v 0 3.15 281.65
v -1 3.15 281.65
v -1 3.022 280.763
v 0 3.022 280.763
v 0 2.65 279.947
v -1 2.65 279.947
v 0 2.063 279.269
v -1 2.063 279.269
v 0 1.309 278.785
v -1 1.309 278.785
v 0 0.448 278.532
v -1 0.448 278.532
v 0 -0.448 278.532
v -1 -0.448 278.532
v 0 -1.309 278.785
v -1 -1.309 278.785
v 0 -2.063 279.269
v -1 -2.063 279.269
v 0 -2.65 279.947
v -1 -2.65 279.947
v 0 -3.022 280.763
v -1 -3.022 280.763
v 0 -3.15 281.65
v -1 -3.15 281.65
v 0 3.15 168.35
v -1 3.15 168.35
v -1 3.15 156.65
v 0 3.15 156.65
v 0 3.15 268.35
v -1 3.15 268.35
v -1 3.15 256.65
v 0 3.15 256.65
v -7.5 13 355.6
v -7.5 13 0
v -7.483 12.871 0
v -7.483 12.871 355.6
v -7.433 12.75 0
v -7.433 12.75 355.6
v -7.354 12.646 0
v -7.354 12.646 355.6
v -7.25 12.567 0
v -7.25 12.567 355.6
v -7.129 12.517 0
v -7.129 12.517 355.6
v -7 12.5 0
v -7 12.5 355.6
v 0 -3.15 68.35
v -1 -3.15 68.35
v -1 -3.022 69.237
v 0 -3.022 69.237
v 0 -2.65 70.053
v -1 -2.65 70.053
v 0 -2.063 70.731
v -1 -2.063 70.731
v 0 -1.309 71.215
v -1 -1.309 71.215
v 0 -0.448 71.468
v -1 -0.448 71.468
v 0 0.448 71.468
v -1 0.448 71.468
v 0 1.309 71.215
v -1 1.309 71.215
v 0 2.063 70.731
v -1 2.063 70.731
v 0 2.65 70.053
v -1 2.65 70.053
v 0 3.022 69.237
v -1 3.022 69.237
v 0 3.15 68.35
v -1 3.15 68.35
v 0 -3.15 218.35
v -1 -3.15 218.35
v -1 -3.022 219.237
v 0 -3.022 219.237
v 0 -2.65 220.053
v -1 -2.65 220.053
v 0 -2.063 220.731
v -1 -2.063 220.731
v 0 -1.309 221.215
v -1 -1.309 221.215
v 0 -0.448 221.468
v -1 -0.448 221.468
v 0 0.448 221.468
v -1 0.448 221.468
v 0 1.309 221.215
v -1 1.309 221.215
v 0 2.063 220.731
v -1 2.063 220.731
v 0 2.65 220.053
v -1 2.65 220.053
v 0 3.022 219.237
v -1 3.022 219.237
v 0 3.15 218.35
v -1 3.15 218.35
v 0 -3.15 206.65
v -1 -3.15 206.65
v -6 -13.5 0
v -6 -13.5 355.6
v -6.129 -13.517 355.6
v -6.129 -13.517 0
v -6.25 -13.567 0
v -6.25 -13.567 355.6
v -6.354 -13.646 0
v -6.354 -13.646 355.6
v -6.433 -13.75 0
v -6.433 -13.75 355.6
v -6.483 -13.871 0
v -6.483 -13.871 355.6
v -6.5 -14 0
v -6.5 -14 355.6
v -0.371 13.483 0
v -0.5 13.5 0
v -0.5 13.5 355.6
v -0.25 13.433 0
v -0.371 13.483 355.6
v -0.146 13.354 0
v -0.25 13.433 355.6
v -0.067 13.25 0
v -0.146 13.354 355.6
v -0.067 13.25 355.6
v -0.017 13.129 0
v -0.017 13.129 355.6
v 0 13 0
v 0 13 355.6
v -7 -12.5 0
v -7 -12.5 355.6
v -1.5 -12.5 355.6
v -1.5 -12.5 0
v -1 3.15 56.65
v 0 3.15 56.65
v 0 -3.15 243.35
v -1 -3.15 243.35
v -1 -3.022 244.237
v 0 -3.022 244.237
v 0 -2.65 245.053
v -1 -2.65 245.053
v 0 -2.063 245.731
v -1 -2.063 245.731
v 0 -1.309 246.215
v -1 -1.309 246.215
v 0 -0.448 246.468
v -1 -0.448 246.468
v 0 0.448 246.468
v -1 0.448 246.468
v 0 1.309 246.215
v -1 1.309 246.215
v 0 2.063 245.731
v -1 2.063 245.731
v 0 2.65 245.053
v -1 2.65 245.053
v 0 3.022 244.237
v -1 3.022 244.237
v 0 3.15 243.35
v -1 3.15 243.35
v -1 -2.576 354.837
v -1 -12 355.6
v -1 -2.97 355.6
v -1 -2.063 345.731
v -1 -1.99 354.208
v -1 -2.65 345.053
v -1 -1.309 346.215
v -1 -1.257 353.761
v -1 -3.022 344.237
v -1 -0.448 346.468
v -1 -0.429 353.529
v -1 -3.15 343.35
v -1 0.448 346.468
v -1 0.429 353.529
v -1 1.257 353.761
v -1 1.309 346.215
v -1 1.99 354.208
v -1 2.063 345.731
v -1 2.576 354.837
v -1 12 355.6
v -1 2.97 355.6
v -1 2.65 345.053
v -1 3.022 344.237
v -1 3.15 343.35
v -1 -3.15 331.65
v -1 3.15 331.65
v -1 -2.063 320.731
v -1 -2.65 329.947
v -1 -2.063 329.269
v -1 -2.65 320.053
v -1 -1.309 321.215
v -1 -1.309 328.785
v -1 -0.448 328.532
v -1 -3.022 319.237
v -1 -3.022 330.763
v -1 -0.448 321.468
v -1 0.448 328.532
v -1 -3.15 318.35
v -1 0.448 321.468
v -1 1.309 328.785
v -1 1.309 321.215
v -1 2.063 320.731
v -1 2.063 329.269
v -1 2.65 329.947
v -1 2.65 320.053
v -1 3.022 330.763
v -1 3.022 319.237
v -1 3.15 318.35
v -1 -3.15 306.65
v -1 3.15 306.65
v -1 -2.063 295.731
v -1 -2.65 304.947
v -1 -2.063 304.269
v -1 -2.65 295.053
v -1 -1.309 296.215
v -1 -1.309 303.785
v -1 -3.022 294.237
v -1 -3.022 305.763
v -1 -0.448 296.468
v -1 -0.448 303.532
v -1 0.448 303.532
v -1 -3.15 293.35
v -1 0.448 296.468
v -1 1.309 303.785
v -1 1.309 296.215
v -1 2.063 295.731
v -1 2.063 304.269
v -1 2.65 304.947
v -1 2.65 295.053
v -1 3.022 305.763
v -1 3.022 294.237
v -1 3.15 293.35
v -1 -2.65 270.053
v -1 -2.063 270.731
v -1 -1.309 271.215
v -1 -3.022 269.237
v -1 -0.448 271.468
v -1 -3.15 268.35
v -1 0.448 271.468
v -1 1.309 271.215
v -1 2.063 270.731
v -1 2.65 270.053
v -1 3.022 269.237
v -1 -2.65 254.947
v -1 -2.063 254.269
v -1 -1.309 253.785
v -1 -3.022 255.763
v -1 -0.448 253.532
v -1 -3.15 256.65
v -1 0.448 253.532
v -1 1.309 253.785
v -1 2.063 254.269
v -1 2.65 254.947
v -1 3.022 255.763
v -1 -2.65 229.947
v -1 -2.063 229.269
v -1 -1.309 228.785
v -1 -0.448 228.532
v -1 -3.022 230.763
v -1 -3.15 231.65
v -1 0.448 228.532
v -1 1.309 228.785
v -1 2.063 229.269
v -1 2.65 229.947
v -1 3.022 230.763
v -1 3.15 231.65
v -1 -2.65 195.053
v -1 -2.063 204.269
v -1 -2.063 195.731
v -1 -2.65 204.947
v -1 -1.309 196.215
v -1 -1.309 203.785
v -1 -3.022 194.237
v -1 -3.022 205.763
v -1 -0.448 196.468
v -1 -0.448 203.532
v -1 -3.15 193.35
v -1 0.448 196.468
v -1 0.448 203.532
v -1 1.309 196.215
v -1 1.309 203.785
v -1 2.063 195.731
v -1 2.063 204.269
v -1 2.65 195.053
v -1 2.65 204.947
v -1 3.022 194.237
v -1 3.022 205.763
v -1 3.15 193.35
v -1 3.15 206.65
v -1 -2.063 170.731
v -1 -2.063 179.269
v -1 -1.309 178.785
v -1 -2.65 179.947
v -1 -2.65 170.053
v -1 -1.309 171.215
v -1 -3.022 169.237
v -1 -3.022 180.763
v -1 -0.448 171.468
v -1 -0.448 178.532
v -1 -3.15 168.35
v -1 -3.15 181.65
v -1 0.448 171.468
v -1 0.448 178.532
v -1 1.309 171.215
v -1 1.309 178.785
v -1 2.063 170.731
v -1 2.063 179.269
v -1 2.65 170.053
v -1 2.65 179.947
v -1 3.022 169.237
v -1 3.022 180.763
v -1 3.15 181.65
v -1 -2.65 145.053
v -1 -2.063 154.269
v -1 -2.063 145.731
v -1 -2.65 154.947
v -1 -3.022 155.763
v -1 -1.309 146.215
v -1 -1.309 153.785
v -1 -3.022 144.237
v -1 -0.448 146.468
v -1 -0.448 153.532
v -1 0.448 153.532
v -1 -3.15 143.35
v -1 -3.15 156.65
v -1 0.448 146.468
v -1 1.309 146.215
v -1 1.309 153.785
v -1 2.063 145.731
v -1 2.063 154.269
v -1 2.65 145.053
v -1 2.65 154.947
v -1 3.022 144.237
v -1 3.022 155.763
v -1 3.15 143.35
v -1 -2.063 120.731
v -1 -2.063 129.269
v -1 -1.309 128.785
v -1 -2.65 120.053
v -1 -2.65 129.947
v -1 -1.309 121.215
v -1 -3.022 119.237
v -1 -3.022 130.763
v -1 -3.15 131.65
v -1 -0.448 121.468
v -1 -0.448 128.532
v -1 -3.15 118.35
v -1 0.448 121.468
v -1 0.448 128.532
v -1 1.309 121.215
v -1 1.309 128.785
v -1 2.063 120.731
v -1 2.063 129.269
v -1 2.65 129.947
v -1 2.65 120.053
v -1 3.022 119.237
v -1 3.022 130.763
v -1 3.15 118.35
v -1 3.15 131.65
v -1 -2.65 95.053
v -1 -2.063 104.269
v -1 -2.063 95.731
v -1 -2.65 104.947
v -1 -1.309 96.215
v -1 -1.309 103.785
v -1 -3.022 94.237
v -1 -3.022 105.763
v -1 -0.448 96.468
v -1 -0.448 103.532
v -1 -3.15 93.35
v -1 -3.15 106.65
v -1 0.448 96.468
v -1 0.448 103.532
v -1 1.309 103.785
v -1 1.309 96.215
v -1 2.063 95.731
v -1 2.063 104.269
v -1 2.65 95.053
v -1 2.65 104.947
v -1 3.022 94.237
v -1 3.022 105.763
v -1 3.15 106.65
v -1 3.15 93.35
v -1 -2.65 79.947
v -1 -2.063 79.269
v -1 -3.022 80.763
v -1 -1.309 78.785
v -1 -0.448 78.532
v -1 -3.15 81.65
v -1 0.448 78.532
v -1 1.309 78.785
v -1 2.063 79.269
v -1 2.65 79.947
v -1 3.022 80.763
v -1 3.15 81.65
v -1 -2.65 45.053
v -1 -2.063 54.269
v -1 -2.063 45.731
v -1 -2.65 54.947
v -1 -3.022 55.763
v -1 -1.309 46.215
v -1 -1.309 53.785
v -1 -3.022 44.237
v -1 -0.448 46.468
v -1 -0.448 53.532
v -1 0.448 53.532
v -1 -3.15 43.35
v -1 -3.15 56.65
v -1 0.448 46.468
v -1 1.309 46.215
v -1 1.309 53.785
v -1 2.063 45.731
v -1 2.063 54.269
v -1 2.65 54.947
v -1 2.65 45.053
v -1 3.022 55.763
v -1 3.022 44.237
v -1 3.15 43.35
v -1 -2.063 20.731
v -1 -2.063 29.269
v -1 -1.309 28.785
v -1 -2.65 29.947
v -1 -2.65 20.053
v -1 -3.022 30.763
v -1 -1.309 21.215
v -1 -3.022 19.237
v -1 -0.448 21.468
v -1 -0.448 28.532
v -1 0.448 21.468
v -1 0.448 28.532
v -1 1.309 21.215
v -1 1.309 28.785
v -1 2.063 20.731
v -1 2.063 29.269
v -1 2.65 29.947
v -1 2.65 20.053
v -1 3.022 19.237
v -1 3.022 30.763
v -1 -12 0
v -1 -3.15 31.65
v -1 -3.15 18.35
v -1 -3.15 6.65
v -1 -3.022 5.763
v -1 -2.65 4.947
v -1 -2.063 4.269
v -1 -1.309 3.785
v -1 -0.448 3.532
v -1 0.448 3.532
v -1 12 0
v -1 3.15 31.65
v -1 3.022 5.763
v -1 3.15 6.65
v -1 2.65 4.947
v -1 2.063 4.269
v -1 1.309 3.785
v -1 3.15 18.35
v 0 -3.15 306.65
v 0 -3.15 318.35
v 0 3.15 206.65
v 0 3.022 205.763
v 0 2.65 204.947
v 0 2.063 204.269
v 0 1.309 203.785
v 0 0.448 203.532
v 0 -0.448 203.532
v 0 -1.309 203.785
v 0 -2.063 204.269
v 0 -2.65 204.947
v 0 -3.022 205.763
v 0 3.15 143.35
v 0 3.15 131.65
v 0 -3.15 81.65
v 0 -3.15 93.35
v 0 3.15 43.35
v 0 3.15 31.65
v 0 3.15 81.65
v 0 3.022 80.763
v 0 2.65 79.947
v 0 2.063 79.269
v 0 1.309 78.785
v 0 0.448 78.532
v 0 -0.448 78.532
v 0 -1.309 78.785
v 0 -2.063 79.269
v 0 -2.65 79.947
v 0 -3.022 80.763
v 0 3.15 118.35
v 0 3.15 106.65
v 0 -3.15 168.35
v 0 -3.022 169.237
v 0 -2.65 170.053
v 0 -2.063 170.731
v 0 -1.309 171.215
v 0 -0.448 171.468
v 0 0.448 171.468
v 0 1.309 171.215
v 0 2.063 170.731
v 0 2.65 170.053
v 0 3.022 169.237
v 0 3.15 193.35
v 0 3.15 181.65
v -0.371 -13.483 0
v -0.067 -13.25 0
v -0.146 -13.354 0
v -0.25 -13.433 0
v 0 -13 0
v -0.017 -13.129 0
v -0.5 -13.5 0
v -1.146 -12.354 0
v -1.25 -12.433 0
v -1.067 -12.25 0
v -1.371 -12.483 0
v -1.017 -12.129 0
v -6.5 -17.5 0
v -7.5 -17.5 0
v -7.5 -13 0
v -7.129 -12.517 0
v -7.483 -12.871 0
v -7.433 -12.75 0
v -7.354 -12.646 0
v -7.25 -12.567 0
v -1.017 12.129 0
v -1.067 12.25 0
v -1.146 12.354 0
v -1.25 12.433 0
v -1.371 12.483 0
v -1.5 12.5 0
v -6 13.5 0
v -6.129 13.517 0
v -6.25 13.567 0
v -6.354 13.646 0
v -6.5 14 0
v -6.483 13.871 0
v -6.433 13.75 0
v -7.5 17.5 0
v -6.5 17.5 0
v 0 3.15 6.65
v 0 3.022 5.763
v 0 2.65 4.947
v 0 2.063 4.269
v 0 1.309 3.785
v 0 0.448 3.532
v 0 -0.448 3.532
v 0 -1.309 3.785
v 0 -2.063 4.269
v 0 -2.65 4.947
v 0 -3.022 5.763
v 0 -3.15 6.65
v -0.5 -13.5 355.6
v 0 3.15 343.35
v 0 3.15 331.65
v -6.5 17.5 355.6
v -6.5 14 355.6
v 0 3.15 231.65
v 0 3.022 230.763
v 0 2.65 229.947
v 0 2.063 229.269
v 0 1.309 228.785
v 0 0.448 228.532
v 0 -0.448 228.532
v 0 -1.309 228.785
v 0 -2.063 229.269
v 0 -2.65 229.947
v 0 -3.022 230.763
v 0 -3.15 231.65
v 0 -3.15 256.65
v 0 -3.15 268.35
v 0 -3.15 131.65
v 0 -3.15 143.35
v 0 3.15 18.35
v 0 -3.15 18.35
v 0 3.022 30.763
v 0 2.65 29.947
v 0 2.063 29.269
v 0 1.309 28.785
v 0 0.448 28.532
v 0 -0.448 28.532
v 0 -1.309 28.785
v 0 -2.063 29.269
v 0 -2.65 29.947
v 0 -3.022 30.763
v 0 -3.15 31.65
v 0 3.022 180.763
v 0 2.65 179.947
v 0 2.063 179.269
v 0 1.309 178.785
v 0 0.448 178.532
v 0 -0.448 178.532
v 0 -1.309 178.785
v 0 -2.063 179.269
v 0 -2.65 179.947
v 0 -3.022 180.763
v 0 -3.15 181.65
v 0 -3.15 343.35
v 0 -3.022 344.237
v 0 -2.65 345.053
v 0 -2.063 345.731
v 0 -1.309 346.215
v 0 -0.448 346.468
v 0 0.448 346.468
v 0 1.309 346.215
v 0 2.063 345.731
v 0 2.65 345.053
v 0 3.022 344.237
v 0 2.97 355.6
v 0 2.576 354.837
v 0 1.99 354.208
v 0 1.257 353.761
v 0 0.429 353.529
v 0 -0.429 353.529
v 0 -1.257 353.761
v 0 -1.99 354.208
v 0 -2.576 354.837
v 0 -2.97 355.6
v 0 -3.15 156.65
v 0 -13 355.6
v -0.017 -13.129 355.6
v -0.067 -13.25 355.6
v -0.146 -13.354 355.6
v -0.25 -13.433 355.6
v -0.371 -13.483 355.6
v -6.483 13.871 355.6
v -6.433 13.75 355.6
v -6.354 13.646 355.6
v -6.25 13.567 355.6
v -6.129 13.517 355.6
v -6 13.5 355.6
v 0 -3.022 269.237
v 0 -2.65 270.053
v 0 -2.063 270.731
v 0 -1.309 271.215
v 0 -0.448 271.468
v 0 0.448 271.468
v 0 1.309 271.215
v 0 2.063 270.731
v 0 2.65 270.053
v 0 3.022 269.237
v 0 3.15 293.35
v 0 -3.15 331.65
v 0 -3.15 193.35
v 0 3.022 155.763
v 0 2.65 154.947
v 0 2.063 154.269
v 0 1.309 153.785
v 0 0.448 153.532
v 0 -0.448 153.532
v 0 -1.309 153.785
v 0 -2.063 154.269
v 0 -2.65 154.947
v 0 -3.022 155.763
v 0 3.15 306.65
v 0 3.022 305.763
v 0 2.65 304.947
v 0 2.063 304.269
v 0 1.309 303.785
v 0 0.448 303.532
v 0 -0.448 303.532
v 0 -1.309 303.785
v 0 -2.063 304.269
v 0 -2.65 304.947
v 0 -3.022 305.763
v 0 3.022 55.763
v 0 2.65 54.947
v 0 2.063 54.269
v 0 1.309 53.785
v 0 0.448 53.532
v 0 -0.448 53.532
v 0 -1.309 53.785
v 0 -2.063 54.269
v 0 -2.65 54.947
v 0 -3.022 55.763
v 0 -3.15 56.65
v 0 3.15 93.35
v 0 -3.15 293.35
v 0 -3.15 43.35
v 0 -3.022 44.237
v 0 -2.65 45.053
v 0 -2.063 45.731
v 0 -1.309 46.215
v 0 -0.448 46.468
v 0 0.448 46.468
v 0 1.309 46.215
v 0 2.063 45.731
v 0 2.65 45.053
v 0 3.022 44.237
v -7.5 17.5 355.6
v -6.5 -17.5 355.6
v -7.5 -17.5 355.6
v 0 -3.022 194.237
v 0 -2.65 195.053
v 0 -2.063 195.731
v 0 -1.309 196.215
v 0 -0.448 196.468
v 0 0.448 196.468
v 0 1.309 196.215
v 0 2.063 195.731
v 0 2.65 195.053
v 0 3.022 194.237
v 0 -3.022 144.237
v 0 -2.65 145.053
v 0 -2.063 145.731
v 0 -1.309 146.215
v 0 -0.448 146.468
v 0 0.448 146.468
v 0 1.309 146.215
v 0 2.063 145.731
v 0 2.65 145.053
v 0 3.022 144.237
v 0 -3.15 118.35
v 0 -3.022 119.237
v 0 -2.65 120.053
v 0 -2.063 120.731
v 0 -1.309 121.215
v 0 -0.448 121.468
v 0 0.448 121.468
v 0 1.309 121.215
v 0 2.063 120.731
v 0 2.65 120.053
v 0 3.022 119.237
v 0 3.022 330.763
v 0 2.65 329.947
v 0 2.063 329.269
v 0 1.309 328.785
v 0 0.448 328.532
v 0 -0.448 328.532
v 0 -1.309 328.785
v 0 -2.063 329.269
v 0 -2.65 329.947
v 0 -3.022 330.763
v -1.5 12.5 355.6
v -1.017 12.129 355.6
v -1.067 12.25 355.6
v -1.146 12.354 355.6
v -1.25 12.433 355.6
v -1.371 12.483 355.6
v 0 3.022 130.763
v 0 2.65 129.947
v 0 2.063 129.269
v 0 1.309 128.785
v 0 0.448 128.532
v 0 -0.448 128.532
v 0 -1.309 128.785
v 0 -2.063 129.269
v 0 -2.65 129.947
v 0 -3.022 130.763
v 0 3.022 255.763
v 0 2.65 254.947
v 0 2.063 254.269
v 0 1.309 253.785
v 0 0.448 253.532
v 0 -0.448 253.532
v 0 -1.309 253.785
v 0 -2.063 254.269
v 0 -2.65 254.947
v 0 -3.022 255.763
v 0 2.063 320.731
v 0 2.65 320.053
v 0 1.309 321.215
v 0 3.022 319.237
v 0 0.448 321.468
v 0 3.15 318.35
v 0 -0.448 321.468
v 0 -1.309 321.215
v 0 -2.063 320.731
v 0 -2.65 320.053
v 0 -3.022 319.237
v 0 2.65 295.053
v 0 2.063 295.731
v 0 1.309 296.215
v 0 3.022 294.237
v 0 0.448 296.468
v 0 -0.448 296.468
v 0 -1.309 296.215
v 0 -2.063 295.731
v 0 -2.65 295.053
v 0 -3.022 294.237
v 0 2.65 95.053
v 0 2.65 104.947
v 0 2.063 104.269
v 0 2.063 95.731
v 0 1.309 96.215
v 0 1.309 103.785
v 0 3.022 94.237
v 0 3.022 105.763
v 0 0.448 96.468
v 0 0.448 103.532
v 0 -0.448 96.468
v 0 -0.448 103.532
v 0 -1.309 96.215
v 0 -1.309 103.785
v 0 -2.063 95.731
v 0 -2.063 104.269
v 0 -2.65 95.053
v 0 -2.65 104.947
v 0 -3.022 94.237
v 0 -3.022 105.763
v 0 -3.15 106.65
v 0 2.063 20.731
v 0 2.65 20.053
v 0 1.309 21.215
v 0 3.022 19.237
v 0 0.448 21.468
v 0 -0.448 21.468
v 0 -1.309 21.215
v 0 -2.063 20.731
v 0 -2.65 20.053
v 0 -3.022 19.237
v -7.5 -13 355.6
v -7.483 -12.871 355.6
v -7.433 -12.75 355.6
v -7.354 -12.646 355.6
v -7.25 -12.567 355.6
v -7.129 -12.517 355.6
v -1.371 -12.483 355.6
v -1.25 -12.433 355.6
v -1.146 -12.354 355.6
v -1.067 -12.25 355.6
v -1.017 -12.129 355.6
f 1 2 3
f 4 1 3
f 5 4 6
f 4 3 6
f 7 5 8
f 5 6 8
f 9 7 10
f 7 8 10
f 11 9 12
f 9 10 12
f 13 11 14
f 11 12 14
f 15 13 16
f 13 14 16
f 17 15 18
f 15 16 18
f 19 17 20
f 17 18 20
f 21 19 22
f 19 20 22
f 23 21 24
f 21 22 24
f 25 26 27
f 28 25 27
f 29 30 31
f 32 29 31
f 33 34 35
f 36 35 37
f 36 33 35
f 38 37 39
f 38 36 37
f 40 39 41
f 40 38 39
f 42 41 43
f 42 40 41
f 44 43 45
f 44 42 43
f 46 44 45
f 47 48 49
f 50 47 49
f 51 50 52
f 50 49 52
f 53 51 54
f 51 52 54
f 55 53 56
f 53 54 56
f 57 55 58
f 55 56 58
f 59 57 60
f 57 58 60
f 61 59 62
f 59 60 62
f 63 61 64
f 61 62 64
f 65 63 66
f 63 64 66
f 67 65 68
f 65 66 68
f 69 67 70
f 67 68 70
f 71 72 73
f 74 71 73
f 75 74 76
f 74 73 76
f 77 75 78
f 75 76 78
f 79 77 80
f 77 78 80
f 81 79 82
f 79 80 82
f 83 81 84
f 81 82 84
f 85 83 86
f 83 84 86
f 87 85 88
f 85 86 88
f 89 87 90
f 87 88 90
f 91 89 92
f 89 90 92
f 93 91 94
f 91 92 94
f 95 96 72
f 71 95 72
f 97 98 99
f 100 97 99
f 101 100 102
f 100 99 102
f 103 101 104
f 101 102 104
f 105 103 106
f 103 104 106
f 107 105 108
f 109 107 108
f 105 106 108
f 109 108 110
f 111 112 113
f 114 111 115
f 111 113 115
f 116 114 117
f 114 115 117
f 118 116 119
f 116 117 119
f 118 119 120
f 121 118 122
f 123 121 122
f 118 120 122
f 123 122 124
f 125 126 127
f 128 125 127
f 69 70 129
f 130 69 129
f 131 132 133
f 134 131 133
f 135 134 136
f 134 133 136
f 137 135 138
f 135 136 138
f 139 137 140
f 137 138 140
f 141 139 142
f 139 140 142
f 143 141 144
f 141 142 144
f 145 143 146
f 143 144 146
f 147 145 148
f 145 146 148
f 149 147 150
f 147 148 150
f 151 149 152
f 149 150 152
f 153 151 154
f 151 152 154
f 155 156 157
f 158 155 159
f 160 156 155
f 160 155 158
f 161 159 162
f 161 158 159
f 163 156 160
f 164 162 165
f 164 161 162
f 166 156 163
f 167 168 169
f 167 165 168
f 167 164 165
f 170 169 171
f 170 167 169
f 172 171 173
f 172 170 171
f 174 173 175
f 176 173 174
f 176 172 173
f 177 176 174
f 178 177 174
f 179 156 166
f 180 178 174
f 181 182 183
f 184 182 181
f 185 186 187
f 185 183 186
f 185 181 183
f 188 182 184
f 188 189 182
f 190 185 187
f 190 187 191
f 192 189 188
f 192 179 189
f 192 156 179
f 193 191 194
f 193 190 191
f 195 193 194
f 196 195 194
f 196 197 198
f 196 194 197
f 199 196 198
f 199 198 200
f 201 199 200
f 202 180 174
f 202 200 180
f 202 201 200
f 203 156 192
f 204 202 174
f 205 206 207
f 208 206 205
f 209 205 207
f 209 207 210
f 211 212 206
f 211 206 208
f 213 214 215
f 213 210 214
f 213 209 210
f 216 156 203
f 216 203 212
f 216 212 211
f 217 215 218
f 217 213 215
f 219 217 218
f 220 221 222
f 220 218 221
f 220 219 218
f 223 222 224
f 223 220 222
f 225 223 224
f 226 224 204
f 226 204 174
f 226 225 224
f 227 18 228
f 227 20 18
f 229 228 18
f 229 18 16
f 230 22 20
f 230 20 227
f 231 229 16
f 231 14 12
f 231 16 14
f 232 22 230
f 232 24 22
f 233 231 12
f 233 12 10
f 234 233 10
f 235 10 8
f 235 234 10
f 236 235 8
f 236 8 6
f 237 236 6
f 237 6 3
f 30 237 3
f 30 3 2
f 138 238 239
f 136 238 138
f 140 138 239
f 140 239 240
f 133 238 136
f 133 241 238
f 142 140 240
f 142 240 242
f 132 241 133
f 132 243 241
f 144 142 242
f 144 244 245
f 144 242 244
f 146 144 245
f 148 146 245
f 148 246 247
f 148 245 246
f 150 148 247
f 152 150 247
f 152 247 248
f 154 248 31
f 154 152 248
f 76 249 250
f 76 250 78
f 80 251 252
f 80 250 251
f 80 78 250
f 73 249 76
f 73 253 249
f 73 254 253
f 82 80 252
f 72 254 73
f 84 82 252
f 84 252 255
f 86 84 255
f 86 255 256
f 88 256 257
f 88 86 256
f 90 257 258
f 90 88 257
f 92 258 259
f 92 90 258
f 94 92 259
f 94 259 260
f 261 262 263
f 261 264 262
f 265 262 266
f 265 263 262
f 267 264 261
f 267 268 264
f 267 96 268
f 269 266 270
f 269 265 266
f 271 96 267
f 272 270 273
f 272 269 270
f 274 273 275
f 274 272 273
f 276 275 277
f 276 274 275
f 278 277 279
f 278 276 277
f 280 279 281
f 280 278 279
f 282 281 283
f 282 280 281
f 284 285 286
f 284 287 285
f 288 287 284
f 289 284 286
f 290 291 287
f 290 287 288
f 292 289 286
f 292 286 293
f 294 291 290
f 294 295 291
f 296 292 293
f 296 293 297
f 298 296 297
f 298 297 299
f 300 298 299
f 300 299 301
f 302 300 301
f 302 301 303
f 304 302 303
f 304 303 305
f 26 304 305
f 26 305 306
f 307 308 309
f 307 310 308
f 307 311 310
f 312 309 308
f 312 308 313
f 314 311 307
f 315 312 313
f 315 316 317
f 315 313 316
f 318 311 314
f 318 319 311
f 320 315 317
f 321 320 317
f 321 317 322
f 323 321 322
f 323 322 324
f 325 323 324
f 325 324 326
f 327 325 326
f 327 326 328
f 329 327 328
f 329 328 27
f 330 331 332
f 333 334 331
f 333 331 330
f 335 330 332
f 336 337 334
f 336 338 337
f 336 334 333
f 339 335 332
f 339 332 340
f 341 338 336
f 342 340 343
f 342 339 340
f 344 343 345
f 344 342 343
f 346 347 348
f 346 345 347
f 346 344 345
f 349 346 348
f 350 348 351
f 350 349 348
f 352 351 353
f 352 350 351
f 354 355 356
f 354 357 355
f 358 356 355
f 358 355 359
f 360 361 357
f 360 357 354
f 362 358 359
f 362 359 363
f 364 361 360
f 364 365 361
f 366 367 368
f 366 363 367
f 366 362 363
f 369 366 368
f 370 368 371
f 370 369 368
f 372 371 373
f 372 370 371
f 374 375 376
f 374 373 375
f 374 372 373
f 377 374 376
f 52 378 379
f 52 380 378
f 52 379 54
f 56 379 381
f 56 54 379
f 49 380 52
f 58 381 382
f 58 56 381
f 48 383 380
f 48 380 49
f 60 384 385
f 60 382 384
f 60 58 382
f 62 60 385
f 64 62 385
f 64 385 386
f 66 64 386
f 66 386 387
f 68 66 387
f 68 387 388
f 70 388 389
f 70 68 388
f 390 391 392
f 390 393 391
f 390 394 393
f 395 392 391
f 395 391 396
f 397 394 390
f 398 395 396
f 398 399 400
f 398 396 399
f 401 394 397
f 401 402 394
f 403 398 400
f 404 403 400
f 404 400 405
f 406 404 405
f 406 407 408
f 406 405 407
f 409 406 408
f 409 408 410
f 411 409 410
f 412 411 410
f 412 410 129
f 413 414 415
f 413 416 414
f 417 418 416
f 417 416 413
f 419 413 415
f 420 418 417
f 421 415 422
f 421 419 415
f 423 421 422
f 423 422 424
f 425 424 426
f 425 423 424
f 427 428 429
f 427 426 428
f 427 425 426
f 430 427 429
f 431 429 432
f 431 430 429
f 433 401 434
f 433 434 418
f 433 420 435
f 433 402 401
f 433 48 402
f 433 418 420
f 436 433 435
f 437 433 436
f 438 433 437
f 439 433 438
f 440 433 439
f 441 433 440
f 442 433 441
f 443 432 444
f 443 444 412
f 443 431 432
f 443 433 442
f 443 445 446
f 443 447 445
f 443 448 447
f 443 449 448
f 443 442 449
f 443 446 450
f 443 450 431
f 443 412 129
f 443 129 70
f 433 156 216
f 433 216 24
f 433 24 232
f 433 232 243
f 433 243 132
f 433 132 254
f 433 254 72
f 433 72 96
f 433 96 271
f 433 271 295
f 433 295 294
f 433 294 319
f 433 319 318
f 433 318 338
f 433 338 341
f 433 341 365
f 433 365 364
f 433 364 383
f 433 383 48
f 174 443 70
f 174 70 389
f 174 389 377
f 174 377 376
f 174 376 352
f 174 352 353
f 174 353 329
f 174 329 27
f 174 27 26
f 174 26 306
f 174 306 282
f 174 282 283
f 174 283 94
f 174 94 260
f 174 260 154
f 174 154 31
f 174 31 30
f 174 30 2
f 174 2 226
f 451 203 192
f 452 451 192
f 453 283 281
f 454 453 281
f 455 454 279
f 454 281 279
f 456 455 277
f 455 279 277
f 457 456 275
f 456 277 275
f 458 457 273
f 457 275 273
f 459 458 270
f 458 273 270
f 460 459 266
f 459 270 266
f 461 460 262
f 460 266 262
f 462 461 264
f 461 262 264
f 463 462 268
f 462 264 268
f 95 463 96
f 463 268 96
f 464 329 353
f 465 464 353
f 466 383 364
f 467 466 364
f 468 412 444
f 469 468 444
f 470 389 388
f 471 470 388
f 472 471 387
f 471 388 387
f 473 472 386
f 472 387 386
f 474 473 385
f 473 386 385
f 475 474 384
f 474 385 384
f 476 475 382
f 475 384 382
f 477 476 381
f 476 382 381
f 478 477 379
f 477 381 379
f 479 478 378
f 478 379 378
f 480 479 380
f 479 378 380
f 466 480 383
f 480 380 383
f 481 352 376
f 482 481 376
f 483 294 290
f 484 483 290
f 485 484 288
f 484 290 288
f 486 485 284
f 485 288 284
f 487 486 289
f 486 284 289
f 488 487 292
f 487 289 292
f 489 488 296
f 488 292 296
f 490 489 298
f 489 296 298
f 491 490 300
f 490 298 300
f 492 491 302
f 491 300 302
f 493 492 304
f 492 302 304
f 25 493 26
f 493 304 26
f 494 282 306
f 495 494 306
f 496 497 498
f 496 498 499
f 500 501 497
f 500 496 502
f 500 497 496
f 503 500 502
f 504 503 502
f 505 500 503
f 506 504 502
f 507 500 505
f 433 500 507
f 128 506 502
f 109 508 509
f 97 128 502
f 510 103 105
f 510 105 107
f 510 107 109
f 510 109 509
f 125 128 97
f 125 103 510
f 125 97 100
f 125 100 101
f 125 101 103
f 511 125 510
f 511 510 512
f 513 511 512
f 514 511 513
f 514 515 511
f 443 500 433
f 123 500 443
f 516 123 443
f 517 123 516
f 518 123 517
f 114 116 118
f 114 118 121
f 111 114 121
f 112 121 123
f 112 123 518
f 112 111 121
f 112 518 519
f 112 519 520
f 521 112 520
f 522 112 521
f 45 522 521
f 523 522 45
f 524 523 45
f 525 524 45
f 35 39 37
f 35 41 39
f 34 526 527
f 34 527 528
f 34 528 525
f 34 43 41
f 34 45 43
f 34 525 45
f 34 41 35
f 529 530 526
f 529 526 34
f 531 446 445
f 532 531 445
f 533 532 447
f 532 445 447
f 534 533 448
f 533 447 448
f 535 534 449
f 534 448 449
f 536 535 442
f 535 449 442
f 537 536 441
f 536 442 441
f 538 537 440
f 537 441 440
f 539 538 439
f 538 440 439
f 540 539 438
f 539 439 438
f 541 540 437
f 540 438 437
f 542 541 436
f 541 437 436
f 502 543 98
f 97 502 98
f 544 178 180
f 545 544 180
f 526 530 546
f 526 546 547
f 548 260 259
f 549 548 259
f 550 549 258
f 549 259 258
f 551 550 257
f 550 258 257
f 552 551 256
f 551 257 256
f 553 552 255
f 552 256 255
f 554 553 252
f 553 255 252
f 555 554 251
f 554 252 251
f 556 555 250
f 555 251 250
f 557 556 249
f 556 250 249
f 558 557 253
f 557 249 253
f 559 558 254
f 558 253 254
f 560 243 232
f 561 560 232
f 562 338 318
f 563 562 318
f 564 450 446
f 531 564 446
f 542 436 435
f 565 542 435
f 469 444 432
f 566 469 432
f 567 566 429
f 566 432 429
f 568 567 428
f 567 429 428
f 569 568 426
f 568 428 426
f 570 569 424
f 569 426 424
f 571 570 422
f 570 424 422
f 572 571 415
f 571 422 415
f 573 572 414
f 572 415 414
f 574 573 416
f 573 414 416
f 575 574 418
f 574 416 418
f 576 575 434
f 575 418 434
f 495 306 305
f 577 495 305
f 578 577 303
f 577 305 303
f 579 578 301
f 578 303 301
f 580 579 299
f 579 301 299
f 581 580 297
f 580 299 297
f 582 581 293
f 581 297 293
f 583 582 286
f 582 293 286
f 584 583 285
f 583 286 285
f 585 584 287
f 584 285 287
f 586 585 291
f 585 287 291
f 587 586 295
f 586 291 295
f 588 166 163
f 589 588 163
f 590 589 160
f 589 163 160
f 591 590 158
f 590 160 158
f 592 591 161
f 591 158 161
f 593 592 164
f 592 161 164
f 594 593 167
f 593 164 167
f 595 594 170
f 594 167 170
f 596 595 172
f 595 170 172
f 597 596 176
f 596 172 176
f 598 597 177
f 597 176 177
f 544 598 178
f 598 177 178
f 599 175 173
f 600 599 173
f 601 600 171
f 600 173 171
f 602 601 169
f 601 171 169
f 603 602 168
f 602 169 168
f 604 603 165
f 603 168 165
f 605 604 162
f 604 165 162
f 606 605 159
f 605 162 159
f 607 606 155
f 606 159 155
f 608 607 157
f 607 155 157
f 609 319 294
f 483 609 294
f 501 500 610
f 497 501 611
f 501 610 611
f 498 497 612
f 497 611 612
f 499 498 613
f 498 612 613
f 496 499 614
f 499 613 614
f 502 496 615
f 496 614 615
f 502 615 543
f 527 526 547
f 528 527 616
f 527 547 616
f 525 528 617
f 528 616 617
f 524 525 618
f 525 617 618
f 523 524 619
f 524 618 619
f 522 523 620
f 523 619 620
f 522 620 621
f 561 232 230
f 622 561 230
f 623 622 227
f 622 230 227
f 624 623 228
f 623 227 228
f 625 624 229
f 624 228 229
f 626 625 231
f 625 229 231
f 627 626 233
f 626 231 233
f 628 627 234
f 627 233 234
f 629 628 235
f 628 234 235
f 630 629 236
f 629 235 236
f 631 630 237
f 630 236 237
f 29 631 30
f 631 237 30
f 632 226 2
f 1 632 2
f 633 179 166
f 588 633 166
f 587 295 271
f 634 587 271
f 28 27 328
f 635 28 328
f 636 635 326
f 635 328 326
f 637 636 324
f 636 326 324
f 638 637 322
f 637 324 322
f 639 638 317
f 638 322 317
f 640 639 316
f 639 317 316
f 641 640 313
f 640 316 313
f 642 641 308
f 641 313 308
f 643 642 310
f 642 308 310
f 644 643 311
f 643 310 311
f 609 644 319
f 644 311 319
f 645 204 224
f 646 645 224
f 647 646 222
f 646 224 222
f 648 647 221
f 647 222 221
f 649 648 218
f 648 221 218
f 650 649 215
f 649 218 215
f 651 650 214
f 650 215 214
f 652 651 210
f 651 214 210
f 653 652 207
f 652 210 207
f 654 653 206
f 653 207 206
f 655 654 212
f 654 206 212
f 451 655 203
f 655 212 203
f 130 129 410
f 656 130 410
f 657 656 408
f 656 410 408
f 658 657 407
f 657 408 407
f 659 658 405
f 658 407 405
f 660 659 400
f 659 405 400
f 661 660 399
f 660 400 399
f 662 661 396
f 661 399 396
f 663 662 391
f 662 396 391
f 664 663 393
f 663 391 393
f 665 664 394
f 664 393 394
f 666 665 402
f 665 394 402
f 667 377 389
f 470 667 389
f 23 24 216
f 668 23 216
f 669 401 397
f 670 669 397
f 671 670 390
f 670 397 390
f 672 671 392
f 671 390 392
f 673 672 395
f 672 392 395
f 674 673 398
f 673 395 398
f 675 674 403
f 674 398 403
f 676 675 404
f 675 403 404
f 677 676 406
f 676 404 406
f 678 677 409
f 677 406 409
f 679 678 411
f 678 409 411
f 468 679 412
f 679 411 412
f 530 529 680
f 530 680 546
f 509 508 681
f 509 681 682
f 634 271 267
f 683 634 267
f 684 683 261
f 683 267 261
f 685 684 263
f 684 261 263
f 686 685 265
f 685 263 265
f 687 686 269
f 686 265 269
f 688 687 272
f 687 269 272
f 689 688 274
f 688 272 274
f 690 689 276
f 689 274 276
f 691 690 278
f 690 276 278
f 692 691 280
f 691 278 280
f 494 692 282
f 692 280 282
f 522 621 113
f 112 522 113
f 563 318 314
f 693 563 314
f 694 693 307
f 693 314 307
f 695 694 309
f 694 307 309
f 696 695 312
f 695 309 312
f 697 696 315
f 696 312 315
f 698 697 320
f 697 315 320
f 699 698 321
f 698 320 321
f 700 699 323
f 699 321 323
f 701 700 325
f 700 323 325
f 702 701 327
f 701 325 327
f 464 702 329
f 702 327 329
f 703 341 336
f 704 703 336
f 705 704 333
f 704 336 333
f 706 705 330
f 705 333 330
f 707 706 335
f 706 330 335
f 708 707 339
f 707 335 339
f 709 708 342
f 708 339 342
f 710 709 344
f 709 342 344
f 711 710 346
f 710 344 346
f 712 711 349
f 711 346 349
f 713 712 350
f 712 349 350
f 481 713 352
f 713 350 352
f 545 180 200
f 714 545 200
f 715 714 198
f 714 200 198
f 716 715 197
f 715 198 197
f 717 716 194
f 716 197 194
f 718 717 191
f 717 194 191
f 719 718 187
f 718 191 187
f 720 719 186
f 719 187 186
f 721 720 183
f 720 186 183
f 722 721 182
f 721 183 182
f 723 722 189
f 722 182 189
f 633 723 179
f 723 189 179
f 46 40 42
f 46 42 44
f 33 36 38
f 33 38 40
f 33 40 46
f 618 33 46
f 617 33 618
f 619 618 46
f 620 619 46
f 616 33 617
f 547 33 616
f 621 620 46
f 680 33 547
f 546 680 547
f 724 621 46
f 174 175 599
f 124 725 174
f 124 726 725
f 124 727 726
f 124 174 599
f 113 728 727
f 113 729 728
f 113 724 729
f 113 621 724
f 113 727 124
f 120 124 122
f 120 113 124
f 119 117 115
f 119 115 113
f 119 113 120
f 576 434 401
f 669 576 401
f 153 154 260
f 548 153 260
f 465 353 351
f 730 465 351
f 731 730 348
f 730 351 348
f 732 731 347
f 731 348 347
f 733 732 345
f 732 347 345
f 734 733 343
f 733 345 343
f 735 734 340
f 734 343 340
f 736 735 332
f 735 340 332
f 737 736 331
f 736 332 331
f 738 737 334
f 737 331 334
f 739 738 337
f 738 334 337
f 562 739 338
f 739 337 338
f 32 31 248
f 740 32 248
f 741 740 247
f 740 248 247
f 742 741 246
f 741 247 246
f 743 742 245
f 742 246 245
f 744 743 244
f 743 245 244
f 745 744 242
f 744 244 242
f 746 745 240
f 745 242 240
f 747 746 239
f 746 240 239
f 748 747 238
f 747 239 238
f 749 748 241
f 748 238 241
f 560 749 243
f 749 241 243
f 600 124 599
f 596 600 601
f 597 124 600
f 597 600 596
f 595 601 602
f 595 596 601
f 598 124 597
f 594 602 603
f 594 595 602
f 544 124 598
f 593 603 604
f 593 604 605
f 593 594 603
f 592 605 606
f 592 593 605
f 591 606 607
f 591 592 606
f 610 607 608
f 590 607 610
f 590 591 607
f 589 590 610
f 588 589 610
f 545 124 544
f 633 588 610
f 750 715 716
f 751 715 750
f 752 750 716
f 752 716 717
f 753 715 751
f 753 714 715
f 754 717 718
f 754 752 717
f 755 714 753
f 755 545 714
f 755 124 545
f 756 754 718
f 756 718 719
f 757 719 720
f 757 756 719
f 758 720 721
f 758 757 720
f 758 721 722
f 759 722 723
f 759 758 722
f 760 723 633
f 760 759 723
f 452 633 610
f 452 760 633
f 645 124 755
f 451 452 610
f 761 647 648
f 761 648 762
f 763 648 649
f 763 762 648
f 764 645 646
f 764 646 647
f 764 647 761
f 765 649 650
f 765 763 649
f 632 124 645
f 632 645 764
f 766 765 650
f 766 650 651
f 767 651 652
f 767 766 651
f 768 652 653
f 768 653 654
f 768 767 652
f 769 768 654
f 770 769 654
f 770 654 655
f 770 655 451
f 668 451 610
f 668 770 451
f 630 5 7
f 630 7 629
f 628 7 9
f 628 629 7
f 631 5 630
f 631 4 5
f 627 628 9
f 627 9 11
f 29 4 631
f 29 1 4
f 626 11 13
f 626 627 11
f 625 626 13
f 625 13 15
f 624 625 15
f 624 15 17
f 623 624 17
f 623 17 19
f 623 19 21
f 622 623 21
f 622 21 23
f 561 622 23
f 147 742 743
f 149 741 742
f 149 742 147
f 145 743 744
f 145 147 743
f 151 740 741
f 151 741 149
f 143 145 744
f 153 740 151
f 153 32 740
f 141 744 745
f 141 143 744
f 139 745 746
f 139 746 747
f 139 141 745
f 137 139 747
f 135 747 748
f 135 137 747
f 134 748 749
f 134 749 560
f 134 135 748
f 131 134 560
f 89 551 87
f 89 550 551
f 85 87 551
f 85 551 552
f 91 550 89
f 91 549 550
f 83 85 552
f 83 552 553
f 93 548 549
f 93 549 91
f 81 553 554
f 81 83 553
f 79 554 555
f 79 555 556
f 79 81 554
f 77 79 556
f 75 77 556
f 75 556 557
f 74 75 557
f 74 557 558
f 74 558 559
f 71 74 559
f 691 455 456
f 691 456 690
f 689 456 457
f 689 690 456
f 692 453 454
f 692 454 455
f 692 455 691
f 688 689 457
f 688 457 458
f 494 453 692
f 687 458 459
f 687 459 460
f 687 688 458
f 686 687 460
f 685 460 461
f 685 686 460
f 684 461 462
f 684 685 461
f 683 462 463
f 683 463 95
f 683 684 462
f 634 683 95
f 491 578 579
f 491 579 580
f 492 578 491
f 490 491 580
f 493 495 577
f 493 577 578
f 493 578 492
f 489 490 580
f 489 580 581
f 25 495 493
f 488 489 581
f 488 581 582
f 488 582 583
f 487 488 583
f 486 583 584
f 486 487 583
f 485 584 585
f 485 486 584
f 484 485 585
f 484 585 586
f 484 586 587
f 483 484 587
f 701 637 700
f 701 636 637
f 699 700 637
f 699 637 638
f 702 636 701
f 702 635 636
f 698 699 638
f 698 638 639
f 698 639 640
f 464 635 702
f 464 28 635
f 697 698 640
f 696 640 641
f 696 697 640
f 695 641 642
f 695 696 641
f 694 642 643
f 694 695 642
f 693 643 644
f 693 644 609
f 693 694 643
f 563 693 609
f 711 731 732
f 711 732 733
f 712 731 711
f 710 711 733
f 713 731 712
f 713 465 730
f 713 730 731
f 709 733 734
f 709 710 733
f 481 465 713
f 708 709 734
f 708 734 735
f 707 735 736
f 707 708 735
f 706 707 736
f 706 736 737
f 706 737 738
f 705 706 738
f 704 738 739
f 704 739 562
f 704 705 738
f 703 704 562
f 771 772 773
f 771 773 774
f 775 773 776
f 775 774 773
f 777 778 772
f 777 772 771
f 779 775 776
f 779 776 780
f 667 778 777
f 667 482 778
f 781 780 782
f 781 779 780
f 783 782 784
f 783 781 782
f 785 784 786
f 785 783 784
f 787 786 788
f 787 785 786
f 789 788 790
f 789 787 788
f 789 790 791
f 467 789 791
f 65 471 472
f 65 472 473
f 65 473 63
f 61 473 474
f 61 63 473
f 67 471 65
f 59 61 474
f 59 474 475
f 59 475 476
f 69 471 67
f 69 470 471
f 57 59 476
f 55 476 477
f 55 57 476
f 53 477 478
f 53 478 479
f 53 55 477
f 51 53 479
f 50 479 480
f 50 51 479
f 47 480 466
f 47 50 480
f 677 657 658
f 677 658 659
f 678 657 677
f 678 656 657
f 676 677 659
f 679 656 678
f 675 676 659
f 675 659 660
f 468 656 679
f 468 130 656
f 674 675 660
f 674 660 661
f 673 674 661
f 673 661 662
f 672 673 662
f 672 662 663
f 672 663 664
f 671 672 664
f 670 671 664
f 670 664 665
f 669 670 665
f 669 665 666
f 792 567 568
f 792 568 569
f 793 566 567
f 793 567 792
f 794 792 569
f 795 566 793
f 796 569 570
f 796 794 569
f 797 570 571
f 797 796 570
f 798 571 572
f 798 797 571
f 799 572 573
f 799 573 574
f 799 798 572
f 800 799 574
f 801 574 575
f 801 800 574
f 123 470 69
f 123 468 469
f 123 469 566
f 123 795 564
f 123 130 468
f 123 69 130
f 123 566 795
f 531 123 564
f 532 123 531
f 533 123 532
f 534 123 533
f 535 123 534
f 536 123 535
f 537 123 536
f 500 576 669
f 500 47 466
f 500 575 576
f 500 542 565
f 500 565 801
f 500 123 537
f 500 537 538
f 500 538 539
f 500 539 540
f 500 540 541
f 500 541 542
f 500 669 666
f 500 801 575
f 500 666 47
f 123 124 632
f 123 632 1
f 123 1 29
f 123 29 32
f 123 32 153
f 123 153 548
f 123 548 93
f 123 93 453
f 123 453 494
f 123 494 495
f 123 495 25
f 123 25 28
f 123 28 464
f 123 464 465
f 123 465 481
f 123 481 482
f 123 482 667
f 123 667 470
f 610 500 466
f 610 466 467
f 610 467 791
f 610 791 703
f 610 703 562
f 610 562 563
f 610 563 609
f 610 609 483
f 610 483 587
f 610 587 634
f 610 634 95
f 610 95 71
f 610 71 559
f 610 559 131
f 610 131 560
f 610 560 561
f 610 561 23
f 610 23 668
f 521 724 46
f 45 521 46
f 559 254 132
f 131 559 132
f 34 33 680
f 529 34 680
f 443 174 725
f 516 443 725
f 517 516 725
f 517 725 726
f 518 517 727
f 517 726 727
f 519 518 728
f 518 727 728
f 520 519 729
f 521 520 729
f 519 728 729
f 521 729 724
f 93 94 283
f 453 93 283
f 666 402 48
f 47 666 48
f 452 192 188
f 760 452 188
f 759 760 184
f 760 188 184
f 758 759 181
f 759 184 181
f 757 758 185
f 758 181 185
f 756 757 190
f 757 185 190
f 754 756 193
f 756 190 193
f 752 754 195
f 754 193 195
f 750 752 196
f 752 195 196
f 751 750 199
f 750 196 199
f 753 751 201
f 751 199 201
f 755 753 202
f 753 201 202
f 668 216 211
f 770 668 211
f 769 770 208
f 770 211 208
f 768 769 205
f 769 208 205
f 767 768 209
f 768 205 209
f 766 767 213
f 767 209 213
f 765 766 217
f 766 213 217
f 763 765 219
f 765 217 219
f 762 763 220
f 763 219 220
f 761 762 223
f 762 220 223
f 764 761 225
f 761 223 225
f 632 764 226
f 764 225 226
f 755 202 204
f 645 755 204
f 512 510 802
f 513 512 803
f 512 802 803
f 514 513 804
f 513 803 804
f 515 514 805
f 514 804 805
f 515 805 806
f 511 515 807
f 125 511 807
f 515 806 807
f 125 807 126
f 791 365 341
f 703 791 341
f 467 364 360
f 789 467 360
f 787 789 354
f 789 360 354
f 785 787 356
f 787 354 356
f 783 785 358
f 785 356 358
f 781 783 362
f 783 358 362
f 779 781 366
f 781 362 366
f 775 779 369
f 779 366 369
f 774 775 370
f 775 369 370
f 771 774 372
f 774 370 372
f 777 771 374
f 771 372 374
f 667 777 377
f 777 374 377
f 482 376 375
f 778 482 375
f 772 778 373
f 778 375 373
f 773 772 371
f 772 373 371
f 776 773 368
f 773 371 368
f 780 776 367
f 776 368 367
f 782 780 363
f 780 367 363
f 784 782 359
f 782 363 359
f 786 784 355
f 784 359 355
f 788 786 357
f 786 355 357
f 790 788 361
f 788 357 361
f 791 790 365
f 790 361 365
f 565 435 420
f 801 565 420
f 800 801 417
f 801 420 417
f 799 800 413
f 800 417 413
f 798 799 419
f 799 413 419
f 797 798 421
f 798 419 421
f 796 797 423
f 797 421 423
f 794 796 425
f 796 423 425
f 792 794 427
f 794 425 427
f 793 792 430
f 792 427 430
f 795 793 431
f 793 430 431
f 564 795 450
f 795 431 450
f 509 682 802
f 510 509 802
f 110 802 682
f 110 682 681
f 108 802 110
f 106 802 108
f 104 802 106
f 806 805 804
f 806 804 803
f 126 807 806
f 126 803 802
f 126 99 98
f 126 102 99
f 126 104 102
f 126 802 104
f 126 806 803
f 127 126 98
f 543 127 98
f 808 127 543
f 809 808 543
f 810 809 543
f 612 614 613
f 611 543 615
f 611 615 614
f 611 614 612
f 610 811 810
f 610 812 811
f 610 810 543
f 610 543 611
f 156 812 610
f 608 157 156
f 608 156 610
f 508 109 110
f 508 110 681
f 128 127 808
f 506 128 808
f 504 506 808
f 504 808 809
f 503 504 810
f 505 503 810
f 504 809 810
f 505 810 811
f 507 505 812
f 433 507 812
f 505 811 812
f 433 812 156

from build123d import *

# Parameters (mm, degrees)
EXTRUDE_THIN1_DEPTH = 449.2625
CUT_EXTRUDE1_START  = -8.5
CUT_EXTRUDE1_DEPTH  = 9.5
LPATTERN1_COUNT     = 18
LPATTERN1_PITCH     = 25
FILLET1_R           = 0.5
SKETCH5_W           = 14.543721181
SKETCH5_H           = 38.348187902
CUT_EXTRUDE2_DEPTH  = 93.6625


with BuildPart() as part:
    # Sketch3 → Extrude-Thin1 (new body)
    with BuildSketch(Plane.XY):
        Polygon((-6.5, 17.5), (-6.5, 13.5), (0, 13.5), (0, -13.5), (-6.5, -13.5), (-6.5, -17.5), (-7.5, -17.5), (-7.5, -12.5), (-1, -12.5), (-1, 12.5), (-7.5, 12.5), (-7.5, 17.5), align=None)
    extrude(amount=EXTRUDE_THIN1_DEPTH)

    # Sketch4 → Cut-Extrude1 (cut)
    with BuildSketch(Plane(origin=(0, 0, 0), x_dir=(0, 0, -1), z_dir=(1, 0, 0)).offset(CUT_EXTRUDE1_START)):
        with BuildLine():
            Line((-6.65, -3.15), (-18.35, -3.15))
            ThreePointArc((-18.35, -3.15), (-21.5, 0), (-18.35, 3.15))
            Line((-18.35, 3.15), (-6.65, 3.15))
            ThreePointArc((-6.65, 3.15), (-3.5, 0), (-6.65, -3.15))
        make_face()
    cut_extrude1 = extrude(amount=CUT_EXTRUDE1_DEPTH, mode=Mode.SUBTRACT)

    # LPattern1: Cut-Extrude1 ×18
    with Locations(*[(0, 0, i * LPATTERN1_PITCH) for i in range(1, LPATTERN1_COUNT)]):
        add(cut_extrude1, mode=Mode.SUBTRACT)

    # Fillet1
    fillet1_edges = [part.edges().sort_by_distance(p)[0] for p in [
        (-6.5, 13.5, 224.63125),
        (0, 13.5, 224.63125),
        (0, -13.5, 224.63125),
        (-6.5, -13.5, 224.63125),
        (-7.5, -12.5, 224.63125),
        (-1, -12.5, 224.63125),
        (-1, 12.5, 224.63125),
        (-7.5, 12.5, 224.63125),
    ]]
    fillet(fillet1_edges, radius=FILLET1_R)

    # Sketch5 → Cut-Extrude2 (cut)
    with BuildSketch(Plane.XY.offset(449.2625)):
        with Locations((-3.04454966, -0.3205253)):
            Rectangle(SKETCH5_W, SKETCH5_H)
    extrude(amount=-CUT_EXTRUDE2_DEPTH, mode=Mode.SUBTRACT)


solid = part.part
